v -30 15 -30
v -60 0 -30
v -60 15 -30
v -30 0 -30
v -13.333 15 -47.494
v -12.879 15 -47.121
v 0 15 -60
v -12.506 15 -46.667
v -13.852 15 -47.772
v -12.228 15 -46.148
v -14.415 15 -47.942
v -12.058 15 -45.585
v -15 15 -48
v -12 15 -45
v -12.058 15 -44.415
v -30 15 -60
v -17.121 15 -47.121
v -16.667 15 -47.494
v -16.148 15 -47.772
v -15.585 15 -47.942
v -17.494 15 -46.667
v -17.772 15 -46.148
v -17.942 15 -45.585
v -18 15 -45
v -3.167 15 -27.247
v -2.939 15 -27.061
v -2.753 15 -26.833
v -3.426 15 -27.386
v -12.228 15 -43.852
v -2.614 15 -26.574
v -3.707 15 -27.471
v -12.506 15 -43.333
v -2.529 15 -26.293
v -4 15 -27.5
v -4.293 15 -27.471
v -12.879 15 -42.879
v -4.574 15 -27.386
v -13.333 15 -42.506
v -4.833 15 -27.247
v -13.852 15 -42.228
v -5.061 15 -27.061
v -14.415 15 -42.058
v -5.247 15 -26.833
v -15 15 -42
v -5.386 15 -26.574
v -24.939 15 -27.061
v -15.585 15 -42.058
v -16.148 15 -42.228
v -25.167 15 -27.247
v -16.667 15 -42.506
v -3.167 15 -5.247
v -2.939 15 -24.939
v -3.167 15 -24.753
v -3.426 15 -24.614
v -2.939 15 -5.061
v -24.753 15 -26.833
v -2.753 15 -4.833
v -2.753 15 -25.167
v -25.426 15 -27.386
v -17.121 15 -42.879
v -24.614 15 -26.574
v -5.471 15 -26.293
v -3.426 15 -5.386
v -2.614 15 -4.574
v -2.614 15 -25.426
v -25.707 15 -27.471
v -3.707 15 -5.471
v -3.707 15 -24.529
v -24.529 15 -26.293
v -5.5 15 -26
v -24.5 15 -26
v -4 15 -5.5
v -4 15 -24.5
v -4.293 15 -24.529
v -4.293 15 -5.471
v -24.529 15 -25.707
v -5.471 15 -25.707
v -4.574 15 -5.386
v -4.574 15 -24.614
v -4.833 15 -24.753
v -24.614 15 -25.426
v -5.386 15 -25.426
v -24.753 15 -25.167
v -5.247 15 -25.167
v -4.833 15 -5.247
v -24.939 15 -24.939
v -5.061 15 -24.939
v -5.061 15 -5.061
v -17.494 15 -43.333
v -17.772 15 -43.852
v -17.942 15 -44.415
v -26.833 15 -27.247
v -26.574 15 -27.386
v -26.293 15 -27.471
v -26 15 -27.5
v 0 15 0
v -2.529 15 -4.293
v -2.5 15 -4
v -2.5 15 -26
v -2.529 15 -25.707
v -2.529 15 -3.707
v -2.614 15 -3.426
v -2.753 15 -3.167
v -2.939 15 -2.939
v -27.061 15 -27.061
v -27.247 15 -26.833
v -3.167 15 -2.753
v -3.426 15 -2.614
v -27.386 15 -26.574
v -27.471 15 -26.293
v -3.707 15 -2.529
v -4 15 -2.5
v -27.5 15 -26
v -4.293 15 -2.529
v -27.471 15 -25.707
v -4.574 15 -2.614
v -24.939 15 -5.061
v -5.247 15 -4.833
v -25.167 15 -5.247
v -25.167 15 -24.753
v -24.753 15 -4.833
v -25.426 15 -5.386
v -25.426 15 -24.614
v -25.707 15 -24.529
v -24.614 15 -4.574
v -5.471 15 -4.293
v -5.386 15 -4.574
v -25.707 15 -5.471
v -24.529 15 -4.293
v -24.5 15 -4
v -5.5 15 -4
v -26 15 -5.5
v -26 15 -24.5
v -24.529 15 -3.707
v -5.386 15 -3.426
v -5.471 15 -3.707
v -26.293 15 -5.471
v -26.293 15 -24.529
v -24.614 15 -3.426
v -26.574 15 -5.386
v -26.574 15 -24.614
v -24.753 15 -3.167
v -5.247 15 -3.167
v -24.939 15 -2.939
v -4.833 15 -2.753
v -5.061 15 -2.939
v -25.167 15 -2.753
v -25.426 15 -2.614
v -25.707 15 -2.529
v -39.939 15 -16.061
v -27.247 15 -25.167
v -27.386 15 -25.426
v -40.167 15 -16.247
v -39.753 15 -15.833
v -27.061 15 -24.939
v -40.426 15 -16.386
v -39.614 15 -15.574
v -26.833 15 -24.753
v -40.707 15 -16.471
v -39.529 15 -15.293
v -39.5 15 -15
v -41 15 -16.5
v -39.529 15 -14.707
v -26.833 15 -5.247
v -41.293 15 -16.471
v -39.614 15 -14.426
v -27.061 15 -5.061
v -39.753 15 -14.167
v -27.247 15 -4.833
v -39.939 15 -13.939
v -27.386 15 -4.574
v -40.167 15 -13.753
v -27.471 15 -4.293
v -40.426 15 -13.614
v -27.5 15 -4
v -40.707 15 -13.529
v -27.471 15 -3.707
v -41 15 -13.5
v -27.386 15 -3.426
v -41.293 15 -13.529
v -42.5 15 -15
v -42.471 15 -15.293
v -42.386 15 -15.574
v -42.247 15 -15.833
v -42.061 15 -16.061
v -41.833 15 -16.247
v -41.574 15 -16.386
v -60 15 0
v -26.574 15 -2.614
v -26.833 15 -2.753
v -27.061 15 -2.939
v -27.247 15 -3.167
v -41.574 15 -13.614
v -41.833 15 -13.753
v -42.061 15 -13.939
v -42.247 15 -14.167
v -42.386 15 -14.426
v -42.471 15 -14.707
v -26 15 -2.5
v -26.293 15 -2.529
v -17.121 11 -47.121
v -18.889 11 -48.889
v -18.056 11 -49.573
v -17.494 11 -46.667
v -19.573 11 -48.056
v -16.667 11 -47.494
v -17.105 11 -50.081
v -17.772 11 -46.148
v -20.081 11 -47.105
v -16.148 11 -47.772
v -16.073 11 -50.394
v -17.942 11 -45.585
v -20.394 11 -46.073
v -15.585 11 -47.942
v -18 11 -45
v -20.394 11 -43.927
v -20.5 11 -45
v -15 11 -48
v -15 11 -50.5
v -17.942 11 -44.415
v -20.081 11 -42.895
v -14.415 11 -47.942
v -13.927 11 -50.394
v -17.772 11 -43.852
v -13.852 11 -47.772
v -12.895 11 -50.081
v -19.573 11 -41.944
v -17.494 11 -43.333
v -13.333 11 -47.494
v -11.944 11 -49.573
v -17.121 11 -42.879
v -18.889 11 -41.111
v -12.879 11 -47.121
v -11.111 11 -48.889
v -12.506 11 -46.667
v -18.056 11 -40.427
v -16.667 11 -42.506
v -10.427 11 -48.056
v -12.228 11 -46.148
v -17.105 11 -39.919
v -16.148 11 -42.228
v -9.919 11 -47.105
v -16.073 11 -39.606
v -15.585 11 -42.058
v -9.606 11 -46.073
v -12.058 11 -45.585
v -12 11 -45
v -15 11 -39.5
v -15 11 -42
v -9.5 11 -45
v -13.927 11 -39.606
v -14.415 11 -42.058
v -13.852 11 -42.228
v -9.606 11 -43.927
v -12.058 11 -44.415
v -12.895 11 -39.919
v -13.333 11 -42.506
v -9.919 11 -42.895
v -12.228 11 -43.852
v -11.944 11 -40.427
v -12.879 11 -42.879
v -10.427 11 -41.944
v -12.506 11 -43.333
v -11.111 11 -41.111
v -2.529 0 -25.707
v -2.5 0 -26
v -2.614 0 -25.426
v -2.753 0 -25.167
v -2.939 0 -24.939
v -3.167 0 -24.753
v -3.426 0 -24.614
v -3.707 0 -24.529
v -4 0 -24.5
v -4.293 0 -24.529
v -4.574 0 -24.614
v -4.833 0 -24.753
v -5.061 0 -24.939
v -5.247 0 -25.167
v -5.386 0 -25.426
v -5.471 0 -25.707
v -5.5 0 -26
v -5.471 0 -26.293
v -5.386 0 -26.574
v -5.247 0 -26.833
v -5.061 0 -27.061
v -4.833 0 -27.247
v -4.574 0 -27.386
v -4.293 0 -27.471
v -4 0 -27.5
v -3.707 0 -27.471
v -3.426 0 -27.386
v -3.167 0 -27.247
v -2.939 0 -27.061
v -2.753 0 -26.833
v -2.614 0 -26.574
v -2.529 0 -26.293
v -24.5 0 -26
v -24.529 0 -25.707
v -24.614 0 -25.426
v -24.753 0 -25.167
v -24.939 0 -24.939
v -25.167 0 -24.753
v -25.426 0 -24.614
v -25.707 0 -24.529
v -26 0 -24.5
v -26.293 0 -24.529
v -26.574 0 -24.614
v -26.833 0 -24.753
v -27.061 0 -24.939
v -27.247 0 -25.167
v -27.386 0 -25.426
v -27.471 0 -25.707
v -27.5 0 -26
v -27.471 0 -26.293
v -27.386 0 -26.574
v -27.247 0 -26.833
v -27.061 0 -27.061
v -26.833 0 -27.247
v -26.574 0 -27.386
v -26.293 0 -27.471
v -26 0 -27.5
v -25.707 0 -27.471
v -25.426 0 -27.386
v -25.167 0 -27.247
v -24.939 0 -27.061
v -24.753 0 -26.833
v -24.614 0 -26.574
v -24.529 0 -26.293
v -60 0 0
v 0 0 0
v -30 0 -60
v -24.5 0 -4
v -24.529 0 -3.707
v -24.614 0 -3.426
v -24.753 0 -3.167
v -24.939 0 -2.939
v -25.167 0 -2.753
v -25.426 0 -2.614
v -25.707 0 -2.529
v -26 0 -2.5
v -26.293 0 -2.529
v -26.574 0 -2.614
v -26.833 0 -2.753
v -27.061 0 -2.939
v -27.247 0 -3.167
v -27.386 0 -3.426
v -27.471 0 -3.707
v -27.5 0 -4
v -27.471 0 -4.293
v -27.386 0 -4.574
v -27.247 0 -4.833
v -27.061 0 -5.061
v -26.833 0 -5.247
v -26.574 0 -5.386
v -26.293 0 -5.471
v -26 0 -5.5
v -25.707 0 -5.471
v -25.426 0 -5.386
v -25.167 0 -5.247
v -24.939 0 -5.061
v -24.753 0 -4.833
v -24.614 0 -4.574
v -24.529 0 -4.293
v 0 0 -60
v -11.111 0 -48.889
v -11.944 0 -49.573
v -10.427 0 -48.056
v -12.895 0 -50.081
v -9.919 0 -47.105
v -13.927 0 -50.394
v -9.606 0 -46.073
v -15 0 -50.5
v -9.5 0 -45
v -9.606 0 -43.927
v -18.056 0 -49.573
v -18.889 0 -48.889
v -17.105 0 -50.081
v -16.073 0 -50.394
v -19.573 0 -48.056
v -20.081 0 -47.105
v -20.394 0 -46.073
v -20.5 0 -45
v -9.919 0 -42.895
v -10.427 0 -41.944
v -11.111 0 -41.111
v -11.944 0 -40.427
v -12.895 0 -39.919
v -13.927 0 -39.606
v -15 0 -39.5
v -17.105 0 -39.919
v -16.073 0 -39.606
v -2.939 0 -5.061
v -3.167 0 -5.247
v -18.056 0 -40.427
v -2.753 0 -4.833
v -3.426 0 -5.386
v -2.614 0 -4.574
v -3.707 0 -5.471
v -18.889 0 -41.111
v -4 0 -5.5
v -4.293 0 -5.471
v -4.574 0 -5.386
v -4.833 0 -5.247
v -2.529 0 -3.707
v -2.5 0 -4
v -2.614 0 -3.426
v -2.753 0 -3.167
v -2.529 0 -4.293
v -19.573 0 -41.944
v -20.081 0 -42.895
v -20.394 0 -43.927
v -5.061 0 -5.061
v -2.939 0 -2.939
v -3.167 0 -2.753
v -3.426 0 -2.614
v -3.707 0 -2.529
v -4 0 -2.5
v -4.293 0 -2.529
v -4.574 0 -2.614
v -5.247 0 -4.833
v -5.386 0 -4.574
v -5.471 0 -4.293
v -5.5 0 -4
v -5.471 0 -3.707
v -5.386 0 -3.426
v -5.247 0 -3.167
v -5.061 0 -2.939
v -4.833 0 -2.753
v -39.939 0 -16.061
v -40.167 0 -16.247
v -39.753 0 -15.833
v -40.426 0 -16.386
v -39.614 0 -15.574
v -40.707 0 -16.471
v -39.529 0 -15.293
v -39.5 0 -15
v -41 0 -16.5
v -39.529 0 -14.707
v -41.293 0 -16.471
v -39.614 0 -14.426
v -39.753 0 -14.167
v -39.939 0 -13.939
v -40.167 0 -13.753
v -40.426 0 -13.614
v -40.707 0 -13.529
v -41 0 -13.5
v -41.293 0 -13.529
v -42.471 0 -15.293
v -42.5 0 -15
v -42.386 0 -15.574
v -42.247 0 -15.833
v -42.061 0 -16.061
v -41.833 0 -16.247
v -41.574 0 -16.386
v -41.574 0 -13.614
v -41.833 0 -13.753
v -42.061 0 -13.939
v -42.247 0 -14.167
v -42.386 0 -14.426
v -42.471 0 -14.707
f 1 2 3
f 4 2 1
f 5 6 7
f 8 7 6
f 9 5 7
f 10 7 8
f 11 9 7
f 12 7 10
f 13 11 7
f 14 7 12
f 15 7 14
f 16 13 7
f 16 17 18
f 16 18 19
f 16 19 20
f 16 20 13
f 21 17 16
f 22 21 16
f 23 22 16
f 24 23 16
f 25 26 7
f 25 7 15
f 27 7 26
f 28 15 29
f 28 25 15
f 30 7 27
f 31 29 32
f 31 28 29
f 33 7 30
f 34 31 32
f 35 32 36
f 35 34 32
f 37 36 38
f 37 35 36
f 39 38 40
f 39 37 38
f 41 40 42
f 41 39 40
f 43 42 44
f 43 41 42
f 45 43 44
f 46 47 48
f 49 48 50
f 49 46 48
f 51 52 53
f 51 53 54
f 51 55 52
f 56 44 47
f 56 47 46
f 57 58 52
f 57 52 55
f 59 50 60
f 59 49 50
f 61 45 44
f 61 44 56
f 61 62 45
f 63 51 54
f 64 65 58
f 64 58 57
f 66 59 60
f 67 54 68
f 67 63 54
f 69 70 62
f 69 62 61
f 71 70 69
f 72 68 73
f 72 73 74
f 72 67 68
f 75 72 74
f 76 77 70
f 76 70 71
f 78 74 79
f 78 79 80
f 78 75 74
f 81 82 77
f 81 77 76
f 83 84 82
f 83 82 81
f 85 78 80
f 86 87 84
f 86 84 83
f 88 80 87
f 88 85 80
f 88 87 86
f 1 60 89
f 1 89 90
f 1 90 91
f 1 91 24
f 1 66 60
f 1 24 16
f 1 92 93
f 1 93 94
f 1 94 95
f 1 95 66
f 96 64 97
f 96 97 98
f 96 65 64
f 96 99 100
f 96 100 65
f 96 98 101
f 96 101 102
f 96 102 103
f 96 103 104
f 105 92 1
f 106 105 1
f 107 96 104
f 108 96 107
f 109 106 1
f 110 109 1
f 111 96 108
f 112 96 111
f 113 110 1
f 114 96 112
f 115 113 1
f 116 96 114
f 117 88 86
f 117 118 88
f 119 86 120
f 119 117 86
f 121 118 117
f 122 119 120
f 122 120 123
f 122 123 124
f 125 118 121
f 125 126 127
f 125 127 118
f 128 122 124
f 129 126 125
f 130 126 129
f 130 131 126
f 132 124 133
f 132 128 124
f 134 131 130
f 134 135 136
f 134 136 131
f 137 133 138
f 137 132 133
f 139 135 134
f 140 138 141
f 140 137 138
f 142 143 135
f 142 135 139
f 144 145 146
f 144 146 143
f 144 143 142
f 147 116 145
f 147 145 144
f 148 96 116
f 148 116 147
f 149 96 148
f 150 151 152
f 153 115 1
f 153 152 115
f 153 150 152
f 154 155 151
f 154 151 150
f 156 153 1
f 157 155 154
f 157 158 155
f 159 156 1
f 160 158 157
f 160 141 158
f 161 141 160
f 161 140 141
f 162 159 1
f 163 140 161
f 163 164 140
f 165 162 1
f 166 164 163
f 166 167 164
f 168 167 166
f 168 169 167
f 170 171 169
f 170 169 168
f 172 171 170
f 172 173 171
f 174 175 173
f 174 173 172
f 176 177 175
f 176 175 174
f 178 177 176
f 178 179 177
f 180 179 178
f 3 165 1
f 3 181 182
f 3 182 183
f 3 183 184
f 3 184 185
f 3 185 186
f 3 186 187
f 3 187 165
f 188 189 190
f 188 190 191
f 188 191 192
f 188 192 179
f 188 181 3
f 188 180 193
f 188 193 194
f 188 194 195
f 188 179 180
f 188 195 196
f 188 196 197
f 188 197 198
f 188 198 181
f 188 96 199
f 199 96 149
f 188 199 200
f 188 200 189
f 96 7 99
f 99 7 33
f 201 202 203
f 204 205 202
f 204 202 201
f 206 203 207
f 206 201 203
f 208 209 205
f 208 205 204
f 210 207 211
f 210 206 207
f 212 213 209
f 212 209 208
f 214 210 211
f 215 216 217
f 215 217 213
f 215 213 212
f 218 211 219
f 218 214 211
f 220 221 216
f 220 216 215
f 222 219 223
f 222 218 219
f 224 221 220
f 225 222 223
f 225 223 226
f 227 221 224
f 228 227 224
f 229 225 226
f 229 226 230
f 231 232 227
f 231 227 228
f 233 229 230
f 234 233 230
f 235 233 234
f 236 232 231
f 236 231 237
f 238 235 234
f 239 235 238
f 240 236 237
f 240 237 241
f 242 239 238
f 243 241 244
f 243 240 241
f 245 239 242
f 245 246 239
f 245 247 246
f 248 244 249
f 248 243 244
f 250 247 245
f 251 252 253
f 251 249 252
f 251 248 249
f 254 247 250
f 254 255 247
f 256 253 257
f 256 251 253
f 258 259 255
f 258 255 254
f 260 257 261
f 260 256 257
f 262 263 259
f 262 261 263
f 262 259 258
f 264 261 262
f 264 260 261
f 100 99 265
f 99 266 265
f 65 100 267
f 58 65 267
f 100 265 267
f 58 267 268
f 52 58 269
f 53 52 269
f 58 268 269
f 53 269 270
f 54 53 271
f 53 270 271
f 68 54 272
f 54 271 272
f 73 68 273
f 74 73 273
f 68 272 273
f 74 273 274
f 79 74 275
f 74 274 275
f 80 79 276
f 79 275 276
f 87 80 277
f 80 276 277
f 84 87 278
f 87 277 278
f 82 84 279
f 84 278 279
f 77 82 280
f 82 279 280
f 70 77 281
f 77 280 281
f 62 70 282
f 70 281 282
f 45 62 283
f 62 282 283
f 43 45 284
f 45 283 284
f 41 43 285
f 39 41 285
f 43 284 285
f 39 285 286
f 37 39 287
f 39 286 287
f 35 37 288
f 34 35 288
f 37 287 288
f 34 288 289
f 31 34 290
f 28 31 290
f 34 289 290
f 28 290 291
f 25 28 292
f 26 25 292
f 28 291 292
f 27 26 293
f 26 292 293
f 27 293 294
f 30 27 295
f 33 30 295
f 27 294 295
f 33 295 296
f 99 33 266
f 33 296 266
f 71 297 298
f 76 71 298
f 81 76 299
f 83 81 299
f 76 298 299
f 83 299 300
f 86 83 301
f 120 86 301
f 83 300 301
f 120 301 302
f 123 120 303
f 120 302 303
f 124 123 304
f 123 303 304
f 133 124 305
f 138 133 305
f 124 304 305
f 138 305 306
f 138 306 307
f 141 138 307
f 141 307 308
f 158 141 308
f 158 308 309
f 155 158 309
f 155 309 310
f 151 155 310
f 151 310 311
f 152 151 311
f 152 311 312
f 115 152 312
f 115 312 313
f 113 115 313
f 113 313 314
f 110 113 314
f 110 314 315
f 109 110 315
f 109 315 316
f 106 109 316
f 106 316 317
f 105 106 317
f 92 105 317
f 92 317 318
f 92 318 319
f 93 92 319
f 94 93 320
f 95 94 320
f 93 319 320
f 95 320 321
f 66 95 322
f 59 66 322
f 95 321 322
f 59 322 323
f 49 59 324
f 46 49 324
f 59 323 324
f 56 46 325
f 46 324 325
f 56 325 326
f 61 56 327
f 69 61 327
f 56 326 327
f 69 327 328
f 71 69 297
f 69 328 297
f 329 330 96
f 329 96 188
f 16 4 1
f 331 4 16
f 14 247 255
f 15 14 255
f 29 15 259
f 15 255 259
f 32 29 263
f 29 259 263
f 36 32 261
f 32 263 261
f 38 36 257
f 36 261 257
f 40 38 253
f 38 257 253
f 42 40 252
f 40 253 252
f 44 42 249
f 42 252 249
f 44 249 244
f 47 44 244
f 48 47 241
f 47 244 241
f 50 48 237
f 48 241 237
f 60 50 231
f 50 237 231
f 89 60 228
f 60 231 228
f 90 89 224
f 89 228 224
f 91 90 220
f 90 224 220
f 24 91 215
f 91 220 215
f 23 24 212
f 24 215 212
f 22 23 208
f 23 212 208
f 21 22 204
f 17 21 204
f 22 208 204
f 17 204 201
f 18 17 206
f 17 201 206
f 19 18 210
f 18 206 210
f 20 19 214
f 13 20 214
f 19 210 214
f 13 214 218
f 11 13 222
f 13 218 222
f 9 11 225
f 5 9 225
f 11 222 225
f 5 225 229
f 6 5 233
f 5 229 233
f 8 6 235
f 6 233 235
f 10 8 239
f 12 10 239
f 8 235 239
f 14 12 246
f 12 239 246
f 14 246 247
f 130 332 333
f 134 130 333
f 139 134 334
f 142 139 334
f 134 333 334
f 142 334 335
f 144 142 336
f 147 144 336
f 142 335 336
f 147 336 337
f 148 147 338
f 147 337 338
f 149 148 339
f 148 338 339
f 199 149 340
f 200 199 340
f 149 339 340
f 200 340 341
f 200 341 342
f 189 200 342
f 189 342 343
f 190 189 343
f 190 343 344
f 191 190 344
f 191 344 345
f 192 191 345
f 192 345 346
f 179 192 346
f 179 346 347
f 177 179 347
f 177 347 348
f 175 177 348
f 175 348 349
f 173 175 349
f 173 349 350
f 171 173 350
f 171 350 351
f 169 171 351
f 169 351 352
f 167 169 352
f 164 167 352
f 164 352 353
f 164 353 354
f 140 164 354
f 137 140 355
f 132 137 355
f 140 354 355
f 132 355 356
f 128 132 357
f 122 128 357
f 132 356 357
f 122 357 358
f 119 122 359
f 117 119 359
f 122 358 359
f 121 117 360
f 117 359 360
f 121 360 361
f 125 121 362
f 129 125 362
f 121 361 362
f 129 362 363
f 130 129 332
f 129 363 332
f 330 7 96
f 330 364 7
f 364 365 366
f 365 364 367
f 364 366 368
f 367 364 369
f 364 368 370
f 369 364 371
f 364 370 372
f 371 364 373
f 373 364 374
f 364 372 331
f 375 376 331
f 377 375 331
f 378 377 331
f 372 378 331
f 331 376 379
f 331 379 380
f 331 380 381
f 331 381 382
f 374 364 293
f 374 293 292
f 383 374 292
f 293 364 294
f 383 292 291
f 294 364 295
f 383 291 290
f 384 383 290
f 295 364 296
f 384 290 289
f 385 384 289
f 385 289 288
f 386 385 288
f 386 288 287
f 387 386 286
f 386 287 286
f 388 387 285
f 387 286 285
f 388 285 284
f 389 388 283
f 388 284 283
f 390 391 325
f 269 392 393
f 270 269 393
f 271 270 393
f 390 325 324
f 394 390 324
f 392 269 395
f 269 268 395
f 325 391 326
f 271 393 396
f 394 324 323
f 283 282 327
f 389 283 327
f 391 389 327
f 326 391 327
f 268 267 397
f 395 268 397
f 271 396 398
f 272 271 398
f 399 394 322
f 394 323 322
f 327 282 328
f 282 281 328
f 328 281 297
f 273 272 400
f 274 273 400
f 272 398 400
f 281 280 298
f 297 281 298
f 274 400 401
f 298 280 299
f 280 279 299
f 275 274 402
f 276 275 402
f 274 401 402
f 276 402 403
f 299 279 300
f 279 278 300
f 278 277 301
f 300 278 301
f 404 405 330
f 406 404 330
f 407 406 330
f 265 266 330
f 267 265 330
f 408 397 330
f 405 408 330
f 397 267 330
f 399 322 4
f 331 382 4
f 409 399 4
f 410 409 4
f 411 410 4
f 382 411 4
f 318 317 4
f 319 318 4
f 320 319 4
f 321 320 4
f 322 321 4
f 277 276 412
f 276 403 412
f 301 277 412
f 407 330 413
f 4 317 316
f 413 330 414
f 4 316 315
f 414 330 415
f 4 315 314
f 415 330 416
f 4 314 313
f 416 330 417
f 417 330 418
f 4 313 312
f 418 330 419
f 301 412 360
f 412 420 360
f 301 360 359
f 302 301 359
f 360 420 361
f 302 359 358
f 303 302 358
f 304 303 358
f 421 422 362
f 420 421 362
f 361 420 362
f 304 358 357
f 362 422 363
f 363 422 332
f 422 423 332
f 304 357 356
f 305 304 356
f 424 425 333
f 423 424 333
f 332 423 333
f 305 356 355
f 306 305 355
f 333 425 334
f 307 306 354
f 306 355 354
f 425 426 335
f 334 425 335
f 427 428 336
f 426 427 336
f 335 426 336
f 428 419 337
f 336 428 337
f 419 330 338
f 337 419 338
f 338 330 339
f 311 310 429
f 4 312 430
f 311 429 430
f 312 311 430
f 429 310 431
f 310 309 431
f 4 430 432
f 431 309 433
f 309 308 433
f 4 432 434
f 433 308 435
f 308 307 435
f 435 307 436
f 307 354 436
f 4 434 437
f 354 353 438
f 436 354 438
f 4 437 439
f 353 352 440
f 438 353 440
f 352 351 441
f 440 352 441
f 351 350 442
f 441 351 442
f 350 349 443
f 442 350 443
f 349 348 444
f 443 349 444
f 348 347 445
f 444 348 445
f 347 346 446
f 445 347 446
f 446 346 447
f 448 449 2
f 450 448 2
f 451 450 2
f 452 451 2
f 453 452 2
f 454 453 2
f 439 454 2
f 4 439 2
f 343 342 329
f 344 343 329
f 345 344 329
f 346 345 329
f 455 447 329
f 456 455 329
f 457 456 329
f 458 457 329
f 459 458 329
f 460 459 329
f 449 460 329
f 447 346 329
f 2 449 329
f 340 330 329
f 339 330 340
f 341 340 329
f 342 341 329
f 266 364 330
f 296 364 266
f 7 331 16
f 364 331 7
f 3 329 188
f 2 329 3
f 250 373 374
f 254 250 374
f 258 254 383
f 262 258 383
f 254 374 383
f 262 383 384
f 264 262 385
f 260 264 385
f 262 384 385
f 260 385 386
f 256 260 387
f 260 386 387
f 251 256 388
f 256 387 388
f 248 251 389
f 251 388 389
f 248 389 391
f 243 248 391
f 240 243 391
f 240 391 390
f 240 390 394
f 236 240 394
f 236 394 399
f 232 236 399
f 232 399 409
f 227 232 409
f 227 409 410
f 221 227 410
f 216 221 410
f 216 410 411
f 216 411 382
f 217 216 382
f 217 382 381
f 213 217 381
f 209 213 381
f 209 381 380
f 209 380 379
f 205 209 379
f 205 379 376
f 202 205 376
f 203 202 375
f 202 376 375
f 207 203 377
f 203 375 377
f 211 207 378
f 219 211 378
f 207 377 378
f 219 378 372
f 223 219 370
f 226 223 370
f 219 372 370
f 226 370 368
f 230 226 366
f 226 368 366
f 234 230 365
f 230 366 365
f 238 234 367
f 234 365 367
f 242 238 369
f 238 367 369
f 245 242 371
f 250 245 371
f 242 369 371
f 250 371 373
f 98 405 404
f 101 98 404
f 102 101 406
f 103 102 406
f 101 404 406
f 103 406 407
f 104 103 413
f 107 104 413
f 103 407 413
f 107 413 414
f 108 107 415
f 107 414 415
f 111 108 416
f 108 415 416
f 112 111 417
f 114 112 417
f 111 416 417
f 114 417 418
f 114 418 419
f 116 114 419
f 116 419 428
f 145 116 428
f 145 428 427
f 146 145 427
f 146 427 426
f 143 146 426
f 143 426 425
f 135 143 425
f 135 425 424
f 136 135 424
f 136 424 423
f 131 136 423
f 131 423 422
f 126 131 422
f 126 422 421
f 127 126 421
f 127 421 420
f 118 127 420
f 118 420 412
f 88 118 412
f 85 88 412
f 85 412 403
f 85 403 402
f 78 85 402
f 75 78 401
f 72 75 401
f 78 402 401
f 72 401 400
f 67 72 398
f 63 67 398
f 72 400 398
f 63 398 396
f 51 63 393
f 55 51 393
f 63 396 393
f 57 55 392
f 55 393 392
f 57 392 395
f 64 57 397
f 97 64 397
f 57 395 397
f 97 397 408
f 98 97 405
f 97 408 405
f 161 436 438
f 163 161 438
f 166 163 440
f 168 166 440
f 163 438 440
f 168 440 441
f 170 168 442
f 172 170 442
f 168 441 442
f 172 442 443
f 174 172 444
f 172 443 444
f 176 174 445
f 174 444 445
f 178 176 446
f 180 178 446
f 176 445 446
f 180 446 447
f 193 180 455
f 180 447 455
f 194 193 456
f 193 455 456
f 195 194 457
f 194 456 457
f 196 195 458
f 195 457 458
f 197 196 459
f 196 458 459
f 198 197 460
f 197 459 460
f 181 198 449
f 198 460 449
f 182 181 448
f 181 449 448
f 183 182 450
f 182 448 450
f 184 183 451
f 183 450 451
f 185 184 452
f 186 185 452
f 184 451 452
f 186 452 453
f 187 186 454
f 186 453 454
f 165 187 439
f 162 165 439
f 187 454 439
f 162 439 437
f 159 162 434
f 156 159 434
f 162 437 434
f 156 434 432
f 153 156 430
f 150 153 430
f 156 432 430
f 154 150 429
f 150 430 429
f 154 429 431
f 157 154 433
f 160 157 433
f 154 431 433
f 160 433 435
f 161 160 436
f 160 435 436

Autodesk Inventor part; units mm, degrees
ref_plane "YZ Plane" through (0, 0, 0) normal (1, 0, 0) x (0, 1, 0)
ref_plane "XZ Plane" through (0, 0, 0) normal (0, 1, 0) x (-1, 0, 0)
ref_plane "XY Plane" through (0, 0, 0) normal (0, 0, 1) x (1, 0, 0)
sketch "Sketch1" plane through (0, 0, 0) normal (0, 1, 0) x (-1, 0, 0)
  line L0 (0, 0) -> (60, 0)
  line L1 (60, 0) -> (60, -30)
  line L2 (60, -30) -> (30, -30)
  line L3 (30, -30) -> (30, -60)
  line L4 (30, -60) -> (0, -60)
  line L5 (0, -60) -> (0, 0)
  dimension "d0" = 60
  dimension "d1" = 30
  dimension "d2" = 30
  dimension "d3" = 30
  dimension "d4" = 30
extrude "Extrusion1" add sketch "Sketch1" along normal blind 15
sketch "Sketch13" plane through (0, 0, 0) normal (0, -1, 0) x (1, 0, 0)
  circle A0 centre (-4, -4) radius 1.5
  circle A1 centre (-26, -4) radius 1.5
  circle A2 centre (-4, -26) radius 1.5
  circle A3 centre (-26, -26) radius 1.5
  point P0 (0, 0)
  dimension "d55" = 3
  dimension "d56" = 3
  dimension "d57" = 3
  dimension "d58" = 3
extrude "Extrusion7" cut sketch "Sketch13" against normal up to next
sketch "Sketch14" plane through (0, 0, 0) normal (0, -1, 0) x (1, 0, 0)
  circle A0 centre (-41, -15) radius 1.5
  line L0 (-60, 0) -> (-60, -30) projected
  line L1 (0, 0) -> (-60, 0) projected
  circle A1 centre (-15, -45) radius 3
  line L2 (-30, -60) -> (0, -60) projected
  line L3 (-30, -30) -> (-30, -60) projected
  dimension "d61" = 3
  dimension "d62" = 19
  dimension "d63" = 15
  dimension "d64" = 6
  dimension "d65" = 15
  dimension "d66" = 15
extrude "Extrusion8" cut sketch "Sketch14" against normal up to next
sketch "Sketch15" plane through (0, 0, 0) normal (0, -1, 0) x (1, 0, 0)
  circle A0 centre (-15, -45) radius 5.5
  point P0 (0, 0)
  dimension "d69" = 11
extrude "Extrusion9" cut sketch "Sketch15" against normal blind 11
sketch "Sketch2" plane through (0, 0, 0) normal (0, -1, 0) x (1, 0, 0)
  point P0 (-15, -45)
sketch "Sketch3" plane through (0, 15, 0) normal (0, 1, 0) x (1, 0, 0)
  point P0 (-45, 15)
properties part number "wooden1" material "Aluminum 6061"
